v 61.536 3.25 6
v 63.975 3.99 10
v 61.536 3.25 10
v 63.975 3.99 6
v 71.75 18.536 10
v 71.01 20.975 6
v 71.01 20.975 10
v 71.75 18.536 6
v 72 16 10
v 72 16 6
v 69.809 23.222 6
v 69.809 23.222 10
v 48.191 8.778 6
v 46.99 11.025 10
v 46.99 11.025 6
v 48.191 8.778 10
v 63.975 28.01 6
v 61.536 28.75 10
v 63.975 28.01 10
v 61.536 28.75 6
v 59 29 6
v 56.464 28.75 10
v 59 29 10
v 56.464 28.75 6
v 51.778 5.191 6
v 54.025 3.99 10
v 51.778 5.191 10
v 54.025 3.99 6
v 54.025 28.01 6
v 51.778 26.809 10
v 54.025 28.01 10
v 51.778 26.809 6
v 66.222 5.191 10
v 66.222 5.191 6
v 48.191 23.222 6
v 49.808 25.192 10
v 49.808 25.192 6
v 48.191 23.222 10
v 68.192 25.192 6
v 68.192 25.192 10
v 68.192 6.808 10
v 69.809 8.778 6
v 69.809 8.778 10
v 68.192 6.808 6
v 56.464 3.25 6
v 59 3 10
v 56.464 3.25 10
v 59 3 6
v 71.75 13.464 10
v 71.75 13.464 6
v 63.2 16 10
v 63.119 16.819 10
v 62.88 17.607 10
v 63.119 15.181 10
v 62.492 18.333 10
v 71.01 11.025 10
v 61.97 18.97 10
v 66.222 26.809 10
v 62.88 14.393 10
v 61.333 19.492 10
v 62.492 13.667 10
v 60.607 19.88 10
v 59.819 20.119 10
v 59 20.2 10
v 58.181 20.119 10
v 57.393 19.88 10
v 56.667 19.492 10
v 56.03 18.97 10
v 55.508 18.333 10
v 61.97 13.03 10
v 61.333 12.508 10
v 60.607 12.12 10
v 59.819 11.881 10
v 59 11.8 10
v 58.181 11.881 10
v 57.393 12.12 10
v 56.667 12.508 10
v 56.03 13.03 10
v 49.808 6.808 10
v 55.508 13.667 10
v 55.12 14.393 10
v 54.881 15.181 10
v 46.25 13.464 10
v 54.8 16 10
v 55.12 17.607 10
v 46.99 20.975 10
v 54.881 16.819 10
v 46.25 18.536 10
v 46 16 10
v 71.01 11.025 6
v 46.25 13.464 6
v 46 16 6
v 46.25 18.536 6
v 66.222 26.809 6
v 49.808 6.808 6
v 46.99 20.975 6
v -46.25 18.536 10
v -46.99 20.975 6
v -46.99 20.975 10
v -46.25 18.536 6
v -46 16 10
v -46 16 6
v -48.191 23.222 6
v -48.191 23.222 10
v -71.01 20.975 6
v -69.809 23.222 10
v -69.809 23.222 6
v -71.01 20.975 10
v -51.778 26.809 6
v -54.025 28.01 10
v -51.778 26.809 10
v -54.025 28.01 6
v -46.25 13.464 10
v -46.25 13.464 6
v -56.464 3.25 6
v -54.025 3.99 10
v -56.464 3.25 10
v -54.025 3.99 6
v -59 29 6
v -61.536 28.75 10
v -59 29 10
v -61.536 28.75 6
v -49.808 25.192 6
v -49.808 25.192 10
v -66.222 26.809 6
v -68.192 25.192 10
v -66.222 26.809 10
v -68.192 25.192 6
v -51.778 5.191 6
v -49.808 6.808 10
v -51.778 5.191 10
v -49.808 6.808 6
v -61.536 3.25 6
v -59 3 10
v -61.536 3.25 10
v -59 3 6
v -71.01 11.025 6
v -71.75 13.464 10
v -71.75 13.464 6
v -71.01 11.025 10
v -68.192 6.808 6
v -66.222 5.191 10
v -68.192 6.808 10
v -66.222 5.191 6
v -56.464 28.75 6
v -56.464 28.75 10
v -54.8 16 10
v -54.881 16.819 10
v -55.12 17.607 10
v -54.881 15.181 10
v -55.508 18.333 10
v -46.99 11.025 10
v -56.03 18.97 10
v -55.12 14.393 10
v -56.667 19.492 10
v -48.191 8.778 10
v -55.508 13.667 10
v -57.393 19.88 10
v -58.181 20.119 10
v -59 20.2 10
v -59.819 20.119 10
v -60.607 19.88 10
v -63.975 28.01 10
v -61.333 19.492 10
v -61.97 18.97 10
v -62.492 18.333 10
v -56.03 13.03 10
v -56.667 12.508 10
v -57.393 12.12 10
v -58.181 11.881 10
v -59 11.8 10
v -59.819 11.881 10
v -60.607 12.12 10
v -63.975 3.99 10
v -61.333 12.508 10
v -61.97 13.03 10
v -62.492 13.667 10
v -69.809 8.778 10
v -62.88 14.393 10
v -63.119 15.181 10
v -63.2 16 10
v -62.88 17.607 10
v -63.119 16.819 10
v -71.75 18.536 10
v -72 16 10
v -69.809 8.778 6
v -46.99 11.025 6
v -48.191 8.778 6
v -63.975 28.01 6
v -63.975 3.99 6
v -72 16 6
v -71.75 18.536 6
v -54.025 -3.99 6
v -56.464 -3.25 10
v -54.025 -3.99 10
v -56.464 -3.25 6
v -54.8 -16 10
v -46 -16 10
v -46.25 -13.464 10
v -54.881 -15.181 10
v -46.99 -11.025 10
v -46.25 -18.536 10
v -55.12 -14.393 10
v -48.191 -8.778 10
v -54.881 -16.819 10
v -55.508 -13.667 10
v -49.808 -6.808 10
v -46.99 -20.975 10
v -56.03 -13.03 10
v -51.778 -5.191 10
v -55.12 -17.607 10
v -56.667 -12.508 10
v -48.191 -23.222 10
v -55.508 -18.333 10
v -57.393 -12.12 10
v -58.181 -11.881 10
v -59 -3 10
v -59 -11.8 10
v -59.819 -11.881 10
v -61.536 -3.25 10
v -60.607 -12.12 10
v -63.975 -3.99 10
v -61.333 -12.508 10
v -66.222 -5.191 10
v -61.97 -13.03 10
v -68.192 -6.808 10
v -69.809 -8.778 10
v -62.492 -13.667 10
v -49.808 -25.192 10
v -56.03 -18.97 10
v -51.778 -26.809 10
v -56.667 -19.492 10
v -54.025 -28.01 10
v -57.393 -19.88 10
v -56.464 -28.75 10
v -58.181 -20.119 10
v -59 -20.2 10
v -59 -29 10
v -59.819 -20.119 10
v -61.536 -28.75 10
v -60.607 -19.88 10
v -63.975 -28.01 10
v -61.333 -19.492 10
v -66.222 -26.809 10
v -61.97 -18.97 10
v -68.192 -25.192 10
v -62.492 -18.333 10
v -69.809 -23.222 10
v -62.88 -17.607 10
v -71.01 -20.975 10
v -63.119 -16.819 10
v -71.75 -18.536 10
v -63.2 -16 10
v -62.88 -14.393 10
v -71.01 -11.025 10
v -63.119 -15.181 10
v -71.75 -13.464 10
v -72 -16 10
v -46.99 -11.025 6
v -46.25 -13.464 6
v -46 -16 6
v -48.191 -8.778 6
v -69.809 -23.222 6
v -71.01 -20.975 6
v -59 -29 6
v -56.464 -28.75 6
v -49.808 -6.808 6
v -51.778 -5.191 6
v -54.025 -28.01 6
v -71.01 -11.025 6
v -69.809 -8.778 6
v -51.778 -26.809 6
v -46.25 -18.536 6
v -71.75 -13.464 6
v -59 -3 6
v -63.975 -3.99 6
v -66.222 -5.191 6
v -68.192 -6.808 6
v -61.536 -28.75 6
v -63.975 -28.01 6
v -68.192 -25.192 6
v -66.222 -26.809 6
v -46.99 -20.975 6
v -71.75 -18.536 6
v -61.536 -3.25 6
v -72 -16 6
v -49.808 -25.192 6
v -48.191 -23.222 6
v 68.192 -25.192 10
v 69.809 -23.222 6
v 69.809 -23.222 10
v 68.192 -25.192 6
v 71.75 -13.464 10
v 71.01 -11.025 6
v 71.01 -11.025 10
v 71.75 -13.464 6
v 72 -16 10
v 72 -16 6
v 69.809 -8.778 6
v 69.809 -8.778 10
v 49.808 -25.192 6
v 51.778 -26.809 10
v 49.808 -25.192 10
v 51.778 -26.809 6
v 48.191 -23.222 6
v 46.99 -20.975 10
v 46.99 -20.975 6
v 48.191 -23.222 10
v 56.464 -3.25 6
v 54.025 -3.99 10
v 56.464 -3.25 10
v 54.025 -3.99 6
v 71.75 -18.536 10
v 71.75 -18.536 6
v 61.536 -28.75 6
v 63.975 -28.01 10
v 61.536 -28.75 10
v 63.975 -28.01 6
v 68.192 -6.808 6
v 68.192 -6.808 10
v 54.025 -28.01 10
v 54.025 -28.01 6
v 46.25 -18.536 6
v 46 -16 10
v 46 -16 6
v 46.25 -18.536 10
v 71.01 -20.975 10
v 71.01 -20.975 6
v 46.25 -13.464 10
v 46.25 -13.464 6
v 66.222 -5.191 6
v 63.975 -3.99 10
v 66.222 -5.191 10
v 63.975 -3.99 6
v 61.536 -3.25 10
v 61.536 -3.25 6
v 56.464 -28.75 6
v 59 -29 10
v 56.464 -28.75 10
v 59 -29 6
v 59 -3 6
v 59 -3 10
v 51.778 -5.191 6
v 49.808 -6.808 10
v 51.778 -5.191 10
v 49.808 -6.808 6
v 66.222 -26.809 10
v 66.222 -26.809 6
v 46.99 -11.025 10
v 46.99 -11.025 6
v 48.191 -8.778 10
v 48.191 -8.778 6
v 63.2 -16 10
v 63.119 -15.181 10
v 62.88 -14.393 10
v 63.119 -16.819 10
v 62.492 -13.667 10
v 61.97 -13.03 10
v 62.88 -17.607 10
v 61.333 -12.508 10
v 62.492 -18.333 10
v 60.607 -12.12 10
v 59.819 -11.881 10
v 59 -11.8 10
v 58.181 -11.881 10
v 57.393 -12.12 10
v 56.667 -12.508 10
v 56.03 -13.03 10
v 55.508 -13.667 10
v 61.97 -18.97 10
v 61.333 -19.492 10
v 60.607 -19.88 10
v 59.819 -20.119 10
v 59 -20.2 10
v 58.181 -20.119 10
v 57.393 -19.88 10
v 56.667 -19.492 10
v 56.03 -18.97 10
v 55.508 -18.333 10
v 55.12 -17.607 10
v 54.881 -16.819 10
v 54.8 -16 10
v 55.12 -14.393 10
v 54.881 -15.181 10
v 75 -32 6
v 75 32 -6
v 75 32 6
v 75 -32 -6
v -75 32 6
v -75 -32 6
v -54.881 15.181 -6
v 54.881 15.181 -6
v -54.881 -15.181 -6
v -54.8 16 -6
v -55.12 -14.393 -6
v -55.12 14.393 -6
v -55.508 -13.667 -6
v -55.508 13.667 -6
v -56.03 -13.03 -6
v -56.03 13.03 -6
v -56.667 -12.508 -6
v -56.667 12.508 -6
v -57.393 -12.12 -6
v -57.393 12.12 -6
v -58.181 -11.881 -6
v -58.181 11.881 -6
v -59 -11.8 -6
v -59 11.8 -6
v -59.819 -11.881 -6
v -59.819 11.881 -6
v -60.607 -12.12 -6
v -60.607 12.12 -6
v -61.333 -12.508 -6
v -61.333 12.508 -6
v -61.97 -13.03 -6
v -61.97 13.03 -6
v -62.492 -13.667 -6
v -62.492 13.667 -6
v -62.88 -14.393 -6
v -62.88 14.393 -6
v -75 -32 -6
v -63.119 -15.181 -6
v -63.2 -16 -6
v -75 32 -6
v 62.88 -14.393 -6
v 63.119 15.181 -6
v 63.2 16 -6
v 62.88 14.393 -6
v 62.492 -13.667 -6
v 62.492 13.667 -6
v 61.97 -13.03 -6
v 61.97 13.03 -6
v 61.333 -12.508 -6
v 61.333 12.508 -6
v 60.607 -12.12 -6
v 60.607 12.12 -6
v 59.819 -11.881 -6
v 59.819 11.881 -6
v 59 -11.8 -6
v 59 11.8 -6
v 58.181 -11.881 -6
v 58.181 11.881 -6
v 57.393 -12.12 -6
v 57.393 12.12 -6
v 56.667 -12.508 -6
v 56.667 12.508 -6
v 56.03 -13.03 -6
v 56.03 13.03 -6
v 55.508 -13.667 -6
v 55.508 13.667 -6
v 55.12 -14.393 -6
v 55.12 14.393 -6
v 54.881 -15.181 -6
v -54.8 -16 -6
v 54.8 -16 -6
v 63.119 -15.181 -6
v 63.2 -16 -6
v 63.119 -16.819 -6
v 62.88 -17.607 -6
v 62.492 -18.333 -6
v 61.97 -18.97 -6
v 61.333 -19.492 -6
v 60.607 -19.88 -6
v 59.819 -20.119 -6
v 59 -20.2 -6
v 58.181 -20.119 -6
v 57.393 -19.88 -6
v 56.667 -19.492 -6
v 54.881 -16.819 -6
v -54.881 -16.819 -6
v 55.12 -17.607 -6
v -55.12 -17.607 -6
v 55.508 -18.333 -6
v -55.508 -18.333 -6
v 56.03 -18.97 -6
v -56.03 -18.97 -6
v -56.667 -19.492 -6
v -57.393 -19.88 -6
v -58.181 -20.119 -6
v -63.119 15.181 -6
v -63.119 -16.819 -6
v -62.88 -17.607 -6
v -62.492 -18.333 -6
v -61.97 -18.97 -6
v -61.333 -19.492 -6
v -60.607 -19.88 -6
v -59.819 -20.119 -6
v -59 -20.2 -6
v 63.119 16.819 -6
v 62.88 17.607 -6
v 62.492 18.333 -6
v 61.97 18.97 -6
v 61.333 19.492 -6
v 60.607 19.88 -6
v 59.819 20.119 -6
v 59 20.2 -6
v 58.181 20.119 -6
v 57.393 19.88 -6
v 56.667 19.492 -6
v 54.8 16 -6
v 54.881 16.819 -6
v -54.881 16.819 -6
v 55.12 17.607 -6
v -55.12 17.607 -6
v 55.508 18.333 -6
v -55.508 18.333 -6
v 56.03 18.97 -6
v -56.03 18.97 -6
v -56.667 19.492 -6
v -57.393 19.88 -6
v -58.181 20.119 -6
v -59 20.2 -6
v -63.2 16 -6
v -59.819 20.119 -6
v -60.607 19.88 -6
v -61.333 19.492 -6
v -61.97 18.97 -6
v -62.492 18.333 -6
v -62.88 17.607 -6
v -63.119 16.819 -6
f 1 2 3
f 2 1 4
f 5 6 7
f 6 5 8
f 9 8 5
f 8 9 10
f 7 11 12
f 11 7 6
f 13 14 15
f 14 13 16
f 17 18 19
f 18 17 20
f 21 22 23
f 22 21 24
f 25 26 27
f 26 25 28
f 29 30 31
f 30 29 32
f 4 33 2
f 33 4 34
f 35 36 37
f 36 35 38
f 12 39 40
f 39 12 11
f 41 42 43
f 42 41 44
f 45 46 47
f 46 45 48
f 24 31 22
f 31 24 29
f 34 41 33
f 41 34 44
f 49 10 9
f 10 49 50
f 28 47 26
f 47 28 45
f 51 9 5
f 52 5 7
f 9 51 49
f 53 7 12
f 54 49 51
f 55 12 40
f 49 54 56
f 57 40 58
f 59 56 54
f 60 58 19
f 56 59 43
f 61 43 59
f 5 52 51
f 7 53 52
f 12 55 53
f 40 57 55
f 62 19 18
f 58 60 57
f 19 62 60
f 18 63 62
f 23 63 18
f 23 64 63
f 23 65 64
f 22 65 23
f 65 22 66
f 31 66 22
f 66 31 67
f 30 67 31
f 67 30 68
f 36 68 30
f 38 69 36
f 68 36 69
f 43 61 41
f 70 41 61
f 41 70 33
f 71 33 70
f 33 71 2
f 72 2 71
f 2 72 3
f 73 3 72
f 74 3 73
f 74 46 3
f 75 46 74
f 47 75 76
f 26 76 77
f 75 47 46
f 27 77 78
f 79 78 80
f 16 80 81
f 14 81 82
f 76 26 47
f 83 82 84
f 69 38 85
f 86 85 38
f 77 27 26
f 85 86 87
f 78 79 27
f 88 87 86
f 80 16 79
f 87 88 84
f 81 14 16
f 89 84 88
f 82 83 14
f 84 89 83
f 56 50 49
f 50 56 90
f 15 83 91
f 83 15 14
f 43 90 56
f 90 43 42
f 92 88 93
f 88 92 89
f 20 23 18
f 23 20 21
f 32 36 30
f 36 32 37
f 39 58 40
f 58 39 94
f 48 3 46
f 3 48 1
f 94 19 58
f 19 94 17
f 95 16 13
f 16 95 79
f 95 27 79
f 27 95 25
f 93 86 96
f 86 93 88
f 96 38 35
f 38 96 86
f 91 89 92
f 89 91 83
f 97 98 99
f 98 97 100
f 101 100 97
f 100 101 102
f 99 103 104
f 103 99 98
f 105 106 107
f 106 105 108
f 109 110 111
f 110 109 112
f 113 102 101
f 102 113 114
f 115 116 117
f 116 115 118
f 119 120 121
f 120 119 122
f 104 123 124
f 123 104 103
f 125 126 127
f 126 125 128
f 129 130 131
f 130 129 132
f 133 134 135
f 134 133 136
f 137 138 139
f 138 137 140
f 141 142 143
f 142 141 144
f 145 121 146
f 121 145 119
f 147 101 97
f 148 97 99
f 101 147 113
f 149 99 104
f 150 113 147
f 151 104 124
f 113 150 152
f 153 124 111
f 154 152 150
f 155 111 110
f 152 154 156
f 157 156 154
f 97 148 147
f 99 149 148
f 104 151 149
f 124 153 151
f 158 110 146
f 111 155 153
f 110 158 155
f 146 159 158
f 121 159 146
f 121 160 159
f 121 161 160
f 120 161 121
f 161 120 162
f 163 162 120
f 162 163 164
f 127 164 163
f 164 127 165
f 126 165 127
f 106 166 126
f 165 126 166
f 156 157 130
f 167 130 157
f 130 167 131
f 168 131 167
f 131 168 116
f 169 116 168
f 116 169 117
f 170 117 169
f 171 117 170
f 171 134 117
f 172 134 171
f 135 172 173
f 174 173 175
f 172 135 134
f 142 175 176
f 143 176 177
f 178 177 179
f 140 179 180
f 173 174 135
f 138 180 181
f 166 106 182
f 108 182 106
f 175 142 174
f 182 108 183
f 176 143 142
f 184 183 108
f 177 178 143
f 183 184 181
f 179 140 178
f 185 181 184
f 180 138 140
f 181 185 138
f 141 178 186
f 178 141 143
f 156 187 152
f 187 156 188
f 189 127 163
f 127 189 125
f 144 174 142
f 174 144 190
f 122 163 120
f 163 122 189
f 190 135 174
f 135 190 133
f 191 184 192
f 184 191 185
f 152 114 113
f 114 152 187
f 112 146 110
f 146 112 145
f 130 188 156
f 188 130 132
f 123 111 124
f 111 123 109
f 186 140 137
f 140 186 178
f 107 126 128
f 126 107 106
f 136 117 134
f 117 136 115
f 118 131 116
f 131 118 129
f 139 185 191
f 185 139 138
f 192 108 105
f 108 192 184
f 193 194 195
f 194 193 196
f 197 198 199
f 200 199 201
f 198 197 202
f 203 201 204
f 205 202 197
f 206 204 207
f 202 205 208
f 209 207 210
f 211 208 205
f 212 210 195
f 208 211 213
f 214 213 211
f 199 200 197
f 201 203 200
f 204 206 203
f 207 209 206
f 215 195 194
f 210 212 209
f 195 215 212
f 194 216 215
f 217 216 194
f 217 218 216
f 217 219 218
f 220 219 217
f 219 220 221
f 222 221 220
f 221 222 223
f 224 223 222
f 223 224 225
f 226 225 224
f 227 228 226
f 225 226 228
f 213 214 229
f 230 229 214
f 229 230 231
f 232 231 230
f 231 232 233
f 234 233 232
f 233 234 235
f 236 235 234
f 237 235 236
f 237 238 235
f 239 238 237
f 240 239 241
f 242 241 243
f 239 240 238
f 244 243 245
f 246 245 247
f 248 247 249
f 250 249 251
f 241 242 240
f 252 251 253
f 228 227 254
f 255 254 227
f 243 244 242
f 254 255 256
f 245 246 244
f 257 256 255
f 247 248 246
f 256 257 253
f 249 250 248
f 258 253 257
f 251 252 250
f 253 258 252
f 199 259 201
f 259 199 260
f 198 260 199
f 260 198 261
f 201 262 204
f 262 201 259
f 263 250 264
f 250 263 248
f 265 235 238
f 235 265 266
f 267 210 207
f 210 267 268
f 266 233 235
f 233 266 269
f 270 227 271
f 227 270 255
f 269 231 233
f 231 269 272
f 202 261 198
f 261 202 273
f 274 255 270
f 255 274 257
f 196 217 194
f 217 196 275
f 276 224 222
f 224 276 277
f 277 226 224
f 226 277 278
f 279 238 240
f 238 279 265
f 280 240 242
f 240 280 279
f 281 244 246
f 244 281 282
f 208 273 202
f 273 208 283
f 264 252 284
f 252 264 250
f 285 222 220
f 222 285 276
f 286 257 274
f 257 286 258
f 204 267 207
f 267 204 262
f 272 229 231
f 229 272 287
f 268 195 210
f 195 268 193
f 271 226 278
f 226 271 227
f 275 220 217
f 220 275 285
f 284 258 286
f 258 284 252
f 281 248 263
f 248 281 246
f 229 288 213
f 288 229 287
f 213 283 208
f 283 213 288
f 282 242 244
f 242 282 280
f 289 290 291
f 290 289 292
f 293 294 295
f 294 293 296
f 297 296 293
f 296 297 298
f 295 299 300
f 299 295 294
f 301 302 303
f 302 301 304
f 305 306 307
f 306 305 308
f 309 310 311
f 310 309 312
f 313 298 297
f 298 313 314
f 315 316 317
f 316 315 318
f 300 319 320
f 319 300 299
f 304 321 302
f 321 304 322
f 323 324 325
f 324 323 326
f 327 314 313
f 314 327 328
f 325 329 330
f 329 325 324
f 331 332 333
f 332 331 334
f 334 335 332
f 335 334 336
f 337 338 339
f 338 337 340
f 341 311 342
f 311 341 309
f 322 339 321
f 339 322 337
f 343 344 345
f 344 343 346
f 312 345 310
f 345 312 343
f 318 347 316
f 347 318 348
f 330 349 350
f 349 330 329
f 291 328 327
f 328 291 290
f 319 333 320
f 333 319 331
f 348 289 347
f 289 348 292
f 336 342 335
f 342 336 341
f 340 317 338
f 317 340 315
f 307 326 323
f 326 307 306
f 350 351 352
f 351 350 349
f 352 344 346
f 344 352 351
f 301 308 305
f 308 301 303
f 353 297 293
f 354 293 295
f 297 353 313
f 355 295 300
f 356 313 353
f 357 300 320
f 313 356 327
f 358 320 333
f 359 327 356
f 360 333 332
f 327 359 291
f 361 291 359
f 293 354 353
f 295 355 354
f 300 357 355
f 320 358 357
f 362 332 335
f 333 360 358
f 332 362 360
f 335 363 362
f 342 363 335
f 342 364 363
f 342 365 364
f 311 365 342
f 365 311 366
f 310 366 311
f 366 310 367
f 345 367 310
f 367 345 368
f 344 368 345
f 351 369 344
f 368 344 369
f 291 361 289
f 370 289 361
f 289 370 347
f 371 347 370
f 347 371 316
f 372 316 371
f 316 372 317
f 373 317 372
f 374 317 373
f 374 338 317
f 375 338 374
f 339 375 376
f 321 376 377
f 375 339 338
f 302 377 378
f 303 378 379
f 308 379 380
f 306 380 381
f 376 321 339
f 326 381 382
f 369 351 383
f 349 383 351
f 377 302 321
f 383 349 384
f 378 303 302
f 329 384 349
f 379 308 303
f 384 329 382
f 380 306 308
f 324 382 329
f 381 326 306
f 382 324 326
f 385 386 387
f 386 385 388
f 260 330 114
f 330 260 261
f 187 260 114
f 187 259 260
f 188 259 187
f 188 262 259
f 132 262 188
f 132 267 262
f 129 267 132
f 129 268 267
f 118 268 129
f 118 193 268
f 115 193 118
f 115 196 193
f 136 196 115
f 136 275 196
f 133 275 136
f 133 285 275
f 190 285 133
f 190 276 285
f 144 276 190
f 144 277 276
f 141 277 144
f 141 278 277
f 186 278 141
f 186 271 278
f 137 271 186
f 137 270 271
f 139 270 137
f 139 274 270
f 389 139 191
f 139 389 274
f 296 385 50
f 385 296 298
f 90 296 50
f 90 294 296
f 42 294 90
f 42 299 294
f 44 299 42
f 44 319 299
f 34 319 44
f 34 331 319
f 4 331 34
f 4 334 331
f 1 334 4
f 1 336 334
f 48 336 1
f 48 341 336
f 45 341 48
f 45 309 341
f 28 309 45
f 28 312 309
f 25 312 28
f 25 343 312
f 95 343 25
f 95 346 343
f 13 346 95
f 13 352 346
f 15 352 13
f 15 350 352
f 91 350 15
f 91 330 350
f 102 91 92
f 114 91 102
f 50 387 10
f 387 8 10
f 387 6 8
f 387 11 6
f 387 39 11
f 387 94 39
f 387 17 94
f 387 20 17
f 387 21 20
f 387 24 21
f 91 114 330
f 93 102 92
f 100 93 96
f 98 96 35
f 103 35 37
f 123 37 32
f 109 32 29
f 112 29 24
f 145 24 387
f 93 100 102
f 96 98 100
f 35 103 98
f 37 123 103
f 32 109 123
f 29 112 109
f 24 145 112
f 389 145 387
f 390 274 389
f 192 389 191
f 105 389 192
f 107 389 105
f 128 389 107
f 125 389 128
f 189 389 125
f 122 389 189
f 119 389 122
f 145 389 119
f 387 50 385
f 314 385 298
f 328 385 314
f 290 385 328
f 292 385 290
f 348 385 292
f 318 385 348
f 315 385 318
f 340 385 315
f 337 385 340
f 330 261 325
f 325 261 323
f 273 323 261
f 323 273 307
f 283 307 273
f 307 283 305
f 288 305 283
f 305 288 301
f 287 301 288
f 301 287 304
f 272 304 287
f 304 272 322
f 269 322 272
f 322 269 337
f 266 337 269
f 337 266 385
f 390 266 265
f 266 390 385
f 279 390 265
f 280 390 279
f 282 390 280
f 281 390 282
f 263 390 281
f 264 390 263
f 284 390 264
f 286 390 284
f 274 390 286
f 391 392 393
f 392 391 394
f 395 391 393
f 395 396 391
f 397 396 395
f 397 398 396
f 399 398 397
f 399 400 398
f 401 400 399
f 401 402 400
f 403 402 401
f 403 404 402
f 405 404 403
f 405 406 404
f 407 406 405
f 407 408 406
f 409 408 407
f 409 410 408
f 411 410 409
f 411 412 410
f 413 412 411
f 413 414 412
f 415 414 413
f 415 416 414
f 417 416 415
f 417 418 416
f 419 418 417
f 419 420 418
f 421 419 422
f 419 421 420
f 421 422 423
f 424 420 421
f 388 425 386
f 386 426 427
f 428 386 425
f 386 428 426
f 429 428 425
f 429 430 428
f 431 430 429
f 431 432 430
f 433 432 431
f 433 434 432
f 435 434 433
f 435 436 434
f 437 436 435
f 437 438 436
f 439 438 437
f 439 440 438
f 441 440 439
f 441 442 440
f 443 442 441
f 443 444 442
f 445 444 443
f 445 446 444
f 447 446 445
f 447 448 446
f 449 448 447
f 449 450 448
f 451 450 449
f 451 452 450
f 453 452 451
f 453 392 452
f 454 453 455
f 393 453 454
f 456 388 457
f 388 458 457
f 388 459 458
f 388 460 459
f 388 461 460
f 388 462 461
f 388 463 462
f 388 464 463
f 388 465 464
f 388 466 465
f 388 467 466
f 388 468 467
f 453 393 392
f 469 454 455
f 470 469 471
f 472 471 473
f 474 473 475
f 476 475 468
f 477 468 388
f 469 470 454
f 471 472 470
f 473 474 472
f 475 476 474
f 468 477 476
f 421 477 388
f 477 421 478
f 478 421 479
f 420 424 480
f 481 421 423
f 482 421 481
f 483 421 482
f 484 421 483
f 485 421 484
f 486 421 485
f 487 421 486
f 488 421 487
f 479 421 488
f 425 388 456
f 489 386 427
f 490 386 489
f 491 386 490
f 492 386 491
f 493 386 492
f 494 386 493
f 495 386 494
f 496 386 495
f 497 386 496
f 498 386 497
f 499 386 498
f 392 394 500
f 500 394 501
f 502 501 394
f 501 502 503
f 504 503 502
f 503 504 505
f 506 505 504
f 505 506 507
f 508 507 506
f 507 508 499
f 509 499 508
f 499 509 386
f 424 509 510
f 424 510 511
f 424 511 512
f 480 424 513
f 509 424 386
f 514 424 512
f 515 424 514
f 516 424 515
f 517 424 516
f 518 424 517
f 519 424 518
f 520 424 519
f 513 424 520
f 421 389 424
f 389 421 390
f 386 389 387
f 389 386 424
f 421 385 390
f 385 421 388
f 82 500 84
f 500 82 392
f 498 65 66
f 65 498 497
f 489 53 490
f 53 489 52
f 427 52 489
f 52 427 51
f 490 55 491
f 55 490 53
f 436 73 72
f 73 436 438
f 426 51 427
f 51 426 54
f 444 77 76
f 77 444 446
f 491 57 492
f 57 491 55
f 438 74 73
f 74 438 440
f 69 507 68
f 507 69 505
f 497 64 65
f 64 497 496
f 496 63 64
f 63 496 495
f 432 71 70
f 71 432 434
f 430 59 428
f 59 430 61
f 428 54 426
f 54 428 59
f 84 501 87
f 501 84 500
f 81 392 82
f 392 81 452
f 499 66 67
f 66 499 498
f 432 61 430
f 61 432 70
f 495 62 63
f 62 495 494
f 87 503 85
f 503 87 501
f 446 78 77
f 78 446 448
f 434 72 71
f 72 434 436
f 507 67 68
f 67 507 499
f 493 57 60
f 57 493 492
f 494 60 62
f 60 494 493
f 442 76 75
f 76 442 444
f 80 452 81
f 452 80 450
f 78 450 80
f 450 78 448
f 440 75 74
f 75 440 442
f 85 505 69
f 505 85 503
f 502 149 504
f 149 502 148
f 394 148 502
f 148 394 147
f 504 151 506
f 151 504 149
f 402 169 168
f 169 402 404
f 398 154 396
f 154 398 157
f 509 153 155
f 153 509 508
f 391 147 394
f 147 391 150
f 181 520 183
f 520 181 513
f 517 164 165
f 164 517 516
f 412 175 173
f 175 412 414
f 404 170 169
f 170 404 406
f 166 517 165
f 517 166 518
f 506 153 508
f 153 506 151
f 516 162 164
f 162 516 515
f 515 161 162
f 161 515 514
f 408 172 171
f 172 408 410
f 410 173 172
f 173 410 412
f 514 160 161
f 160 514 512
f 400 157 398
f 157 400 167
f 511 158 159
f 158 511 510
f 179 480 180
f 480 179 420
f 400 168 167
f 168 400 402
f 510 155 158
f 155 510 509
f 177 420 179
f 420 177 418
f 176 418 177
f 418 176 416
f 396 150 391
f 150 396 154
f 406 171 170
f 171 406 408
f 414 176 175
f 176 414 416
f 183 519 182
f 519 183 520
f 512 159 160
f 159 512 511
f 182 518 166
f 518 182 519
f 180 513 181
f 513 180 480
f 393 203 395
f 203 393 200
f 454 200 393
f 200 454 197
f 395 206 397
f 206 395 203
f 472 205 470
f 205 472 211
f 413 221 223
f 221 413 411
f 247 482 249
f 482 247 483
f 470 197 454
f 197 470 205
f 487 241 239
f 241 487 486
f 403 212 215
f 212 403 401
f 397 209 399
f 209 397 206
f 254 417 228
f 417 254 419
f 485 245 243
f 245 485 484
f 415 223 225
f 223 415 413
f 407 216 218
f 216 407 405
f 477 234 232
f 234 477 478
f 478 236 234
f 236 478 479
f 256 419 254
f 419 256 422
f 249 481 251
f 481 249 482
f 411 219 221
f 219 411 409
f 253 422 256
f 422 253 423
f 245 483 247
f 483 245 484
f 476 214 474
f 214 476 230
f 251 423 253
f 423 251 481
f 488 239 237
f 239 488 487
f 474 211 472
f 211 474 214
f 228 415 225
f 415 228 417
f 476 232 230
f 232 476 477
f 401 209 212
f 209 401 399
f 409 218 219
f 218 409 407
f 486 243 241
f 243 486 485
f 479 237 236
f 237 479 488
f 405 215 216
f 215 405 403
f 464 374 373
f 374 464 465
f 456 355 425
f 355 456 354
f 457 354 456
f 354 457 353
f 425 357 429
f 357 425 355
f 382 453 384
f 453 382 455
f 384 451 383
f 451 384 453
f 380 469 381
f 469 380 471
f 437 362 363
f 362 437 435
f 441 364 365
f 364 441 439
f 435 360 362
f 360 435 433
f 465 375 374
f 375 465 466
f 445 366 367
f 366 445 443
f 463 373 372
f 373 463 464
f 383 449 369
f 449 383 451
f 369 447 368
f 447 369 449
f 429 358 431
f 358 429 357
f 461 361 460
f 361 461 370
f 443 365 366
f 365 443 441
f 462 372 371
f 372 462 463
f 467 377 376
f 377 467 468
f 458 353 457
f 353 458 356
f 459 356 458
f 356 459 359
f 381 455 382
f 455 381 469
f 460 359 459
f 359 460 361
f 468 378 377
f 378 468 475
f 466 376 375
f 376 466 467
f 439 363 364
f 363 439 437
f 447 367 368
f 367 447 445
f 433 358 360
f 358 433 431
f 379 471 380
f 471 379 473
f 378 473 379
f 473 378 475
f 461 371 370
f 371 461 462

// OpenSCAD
$fn = 32;

// ----------------------------------------------------------------------
// Anchor pads 150 x 64 x 16
// four corner bosses with anchor holes
// ----------------------------------------------------------------------

// --- parameters (mm) ---
plate = [150, 64, 12];  // base plate size (x, y, z)
pads = 4;               // boss count, one per corner
edge = 16;              // boss centre offset from the plate edge
boss_d = 26;            // boss diameter
boss_h = 4;             // boss height above the base plate
hole_d = 8.4;           // hole diameter

// --- derived feature positions (mm) ---
height = plate[2] + boss_h;      // = 16   overall height of the part
corner_x = plate[0] / 2 - edge;  // = 59   boss centre X
corner_y = plate[1] / 2 - edge;  // = 16   boss centre Y
feature_centers = [
  [corner_x, corner_y],
  [-corner_x, corner_y],
  [-corner_x, -corner_y],
  [corner_x, -corner_y]
];   // boss centres, anchor holes are drilled there

// base plate, four bosses standing on it, anchor holes all the way through
difference() {
  union() {
    cube(plate, center = true);
    for (centre = feature_centers)
      translate([centre[0], centre[1], plate[2] / 2 - 1])
        cylinder(d = boss_d, h = boss_h + 1);
  }
  for (centre = feature_centers)
    translate([centre[0], centre[1], -height])
      cylinder(d = hole_d, h = 2 * height + 2);  // through boss and plate
}
